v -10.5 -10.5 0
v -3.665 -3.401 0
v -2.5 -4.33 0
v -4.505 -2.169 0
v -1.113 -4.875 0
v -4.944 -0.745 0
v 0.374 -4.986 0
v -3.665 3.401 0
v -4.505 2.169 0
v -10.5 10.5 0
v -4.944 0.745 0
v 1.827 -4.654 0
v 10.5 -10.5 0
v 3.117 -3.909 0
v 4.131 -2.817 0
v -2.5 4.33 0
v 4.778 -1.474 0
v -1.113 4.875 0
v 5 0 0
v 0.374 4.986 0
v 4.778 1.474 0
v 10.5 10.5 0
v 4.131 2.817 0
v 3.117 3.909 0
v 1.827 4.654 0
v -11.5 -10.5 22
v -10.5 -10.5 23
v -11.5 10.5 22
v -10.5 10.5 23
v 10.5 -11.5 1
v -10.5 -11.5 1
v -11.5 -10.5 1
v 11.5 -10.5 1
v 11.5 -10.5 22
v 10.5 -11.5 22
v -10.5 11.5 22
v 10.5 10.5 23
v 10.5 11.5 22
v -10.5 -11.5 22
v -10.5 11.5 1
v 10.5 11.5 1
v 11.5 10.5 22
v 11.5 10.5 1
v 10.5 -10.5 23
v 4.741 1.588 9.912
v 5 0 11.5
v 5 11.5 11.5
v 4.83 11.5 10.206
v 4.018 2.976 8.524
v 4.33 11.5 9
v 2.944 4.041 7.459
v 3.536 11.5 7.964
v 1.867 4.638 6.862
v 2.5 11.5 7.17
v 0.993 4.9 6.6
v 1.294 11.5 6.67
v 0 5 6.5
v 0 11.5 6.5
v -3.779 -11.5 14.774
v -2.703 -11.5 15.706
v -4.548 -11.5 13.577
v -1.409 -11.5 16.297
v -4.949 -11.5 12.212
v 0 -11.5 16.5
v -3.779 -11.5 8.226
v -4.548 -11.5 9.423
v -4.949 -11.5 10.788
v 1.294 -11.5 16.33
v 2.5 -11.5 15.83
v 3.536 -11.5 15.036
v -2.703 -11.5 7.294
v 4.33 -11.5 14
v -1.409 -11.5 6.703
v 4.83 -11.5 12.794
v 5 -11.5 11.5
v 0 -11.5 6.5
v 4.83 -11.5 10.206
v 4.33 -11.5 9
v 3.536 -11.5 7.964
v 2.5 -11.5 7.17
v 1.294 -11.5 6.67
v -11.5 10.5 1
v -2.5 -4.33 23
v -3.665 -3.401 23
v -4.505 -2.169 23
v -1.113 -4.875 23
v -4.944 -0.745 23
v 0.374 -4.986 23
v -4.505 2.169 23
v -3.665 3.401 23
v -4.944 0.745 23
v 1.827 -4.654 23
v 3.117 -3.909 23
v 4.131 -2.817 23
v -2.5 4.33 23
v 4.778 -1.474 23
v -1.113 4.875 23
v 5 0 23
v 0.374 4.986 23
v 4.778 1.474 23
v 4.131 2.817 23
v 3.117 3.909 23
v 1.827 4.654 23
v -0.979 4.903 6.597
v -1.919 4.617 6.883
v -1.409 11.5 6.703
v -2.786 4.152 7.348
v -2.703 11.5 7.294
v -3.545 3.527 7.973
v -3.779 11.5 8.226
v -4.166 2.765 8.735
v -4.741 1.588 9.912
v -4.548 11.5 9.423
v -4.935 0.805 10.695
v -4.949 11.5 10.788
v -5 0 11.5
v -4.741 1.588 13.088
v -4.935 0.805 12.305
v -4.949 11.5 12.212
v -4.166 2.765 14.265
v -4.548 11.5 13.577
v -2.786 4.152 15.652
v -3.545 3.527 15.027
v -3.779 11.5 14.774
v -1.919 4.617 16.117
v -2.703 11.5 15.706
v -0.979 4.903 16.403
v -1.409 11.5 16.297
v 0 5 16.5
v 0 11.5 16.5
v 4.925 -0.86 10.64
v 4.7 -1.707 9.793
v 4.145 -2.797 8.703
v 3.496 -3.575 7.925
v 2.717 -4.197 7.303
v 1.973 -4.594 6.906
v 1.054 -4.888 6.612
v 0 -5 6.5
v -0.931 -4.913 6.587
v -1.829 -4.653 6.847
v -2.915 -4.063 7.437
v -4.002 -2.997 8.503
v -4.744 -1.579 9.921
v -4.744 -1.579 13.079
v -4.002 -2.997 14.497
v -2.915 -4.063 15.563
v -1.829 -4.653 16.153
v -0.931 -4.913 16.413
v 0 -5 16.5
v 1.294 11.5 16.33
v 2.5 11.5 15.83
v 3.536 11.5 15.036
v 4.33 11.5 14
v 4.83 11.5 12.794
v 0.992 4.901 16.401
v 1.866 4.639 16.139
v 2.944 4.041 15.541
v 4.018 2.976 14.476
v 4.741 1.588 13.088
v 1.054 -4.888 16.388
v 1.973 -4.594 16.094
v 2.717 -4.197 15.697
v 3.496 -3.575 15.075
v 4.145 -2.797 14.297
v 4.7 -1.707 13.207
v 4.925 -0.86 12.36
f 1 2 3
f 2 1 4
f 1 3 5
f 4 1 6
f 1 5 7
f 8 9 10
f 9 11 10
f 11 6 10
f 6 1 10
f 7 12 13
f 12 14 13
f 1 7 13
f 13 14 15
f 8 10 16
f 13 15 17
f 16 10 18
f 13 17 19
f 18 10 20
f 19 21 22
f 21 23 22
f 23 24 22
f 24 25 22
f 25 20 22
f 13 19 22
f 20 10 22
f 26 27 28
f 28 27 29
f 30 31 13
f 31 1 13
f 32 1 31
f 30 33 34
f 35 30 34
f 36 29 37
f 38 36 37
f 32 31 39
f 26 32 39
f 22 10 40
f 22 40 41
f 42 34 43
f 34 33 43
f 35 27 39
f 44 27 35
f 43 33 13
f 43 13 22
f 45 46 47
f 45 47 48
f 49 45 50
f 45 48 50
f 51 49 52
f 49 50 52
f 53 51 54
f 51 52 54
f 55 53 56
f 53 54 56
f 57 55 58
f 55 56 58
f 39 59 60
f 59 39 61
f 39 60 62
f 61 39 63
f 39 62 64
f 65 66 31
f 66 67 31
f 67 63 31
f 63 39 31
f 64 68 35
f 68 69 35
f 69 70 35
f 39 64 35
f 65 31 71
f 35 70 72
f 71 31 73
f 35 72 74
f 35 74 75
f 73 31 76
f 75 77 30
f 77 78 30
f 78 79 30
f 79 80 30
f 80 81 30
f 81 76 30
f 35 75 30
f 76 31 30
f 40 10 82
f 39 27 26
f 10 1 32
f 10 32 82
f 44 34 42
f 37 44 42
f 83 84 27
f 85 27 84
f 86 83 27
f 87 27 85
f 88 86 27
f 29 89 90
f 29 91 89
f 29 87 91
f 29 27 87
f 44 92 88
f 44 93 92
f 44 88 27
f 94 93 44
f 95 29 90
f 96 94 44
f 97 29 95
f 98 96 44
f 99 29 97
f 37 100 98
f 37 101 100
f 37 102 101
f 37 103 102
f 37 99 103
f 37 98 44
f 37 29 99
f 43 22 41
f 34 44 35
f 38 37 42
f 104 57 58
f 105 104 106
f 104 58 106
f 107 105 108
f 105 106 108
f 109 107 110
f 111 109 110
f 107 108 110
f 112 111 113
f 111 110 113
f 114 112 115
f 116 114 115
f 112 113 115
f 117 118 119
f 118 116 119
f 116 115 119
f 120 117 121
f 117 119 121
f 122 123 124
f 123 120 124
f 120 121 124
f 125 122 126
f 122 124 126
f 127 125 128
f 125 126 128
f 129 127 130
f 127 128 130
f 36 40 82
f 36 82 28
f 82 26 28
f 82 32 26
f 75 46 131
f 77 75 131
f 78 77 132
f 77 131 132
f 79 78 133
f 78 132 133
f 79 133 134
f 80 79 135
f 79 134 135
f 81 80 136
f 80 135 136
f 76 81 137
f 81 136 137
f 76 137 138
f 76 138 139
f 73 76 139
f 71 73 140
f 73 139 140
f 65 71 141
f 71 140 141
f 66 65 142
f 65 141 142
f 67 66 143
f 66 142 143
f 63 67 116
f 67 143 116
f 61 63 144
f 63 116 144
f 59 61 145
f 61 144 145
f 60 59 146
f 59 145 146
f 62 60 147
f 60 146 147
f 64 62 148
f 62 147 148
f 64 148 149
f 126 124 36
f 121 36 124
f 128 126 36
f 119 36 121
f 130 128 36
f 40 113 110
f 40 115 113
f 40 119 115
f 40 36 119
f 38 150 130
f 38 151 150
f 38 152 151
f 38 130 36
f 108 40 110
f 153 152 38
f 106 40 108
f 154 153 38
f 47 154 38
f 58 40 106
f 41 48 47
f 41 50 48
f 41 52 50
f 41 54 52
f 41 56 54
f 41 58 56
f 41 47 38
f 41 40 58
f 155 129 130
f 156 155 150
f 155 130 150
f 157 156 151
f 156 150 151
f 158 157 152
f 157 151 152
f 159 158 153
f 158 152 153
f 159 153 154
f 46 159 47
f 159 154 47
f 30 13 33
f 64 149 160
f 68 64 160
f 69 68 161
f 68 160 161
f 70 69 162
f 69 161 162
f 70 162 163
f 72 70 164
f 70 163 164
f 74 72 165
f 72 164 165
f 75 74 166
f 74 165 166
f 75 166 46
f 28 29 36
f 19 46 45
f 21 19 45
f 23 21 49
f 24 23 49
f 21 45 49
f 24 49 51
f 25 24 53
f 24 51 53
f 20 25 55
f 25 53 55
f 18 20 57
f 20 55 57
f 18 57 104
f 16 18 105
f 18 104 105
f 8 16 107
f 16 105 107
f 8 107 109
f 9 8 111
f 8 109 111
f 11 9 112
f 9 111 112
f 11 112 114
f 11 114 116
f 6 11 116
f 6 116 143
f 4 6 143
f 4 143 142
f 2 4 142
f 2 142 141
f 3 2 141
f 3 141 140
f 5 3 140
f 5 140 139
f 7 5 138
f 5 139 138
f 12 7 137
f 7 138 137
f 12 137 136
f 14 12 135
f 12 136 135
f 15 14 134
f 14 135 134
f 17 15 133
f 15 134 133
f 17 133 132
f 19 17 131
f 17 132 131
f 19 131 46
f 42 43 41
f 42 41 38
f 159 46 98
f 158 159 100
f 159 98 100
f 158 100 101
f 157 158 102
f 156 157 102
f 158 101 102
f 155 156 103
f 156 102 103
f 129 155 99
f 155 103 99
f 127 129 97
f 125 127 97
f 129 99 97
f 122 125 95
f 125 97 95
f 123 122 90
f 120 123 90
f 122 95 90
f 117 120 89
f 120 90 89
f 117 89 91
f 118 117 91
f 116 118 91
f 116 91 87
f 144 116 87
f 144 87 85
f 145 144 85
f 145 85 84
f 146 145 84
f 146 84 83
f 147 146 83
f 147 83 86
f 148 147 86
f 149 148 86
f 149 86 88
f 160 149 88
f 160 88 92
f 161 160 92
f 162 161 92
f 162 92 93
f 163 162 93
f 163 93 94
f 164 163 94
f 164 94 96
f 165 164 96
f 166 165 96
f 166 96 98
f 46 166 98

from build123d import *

# Parameters (mm, degrees)
SKETCH1_W           = 23
SKETCH1_H           = 23
BOSS_EXTRUDE1_DEPTH = 23
SKETCH2_R           = 5
CUT_EXTRUDE1_DEPTH  = 23
CUT_EXTRUDE2_DEPTH  = 23
CHAMFER1_SIZE       = 1


with BuildPart() as part:
    # Sketch1 → Boss-Extrude1 (new body)
    with BuildSketch(Plane.XY):
        Rectangle(SKETCH1_W, SKETCH1_H)
    extrude(amount=BOSS_EXTRUDE1_DEPTH)

    # Sketch2 → Cut-Extrude1 (cut)
    with BuildSketch(Plane.XY.offset(23)):
        Circle(SKETCH2_R)
    extrude(amount=-CUT_EXTRUDE1_DEPTH, mode=Mode.SUBTRACT)

    # Sketch3 → Cut-Extrude2 (cut)
    with BuildSketch(Plane(origin=(0, 11.5, 0), x_dir=(1, 0, 0), z_dir=(0, 1, 0))):
        with BuildLine():
            ThreePointArc((5, -11.5), (3.535533906, -7.964466094), (0, -6.5))
            Line((0, -6.5), (0, -16.5))
            ThreePointArc((0, -16.5), (3.535533906, -15.035533906), (5, -11.5))
        make_face()
        with BuildLine():
            Line((0, -16.5), (0, -6.5))
            ThreePointArc((0, -6.5), (-5, -11.5), (0, -16.5))
        make_face()
    extrude(amount=-CUT_EXTRUDE2_DEPTH, mode=Mode.SUBTRACT)

    # Chamfer1
    chamfer1_edges = [part.edges().sort_by_distance(p)[0] for p in [
        (-11.5, 0, 23),
        (0, -11.5, 23),
        (11.5, 0, 23),
        (0, -11.5, 0),
        (-11.5, 0, 0),
        (0, 11.5, 0),
        (11.5, 0, 0),
        (0, 11.5, 23),
        (11.5, -11.5, 11.5),
        (-11.5, -11.5, 11.5),
        (-11.5, 11.5, 11.5),
        (11.5, 11.5, 11.5),
    ]]
    chamfer(chamfer1_edges, length=CHAMFER1_SIZE)


solid = part.part
